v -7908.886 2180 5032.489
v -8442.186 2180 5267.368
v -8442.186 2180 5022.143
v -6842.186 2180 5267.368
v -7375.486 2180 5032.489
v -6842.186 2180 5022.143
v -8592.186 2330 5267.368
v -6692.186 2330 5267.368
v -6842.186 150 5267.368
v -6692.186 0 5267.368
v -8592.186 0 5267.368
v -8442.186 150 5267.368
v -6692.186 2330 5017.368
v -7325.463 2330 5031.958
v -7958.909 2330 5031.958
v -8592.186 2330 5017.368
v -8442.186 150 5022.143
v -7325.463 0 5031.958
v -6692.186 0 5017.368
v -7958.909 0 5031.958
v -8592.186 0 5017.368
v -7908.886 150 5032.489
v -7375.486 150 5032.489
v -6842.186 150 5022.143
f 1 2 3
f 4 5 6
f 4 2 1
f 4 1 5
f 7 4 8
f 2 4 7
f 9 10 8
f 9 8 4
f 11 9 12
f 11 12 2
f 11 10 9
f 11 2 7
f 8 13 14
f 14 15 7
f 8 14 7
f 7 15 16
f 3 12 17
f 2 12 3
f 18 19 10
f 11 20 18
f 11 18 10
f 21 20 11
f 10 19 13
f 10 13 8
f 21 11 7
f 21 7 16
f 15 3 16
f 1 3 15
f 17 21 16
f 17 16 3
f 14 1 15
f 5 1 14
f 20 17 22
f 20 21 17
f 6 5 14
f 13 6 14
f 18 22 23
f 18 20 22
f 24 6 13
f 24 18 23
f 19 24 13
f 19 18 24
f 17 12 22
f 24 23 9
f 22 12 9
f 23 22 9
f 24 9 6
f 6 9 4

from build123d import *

# Parameters (mm, degrees)
BOSS_EXTRUDE1_DEPTH = 2330
SKETCH3_W           = 1600
SKETCH3_H           = 2030
CUT_EXTRUDE1_DEPTH  = 3000


with BuildPart() as part:
    # Sketch2 → Boss-Extrude1 (new body)
    with BuildSketch(Plane(origin=(0, 0, 0), x_dir=(1, 0, 0), z_dir=(0, 1, 0))):
        with BuildLine():
            Line((-6692.186143144, -5017.367964626), (-6692.186143144, -5267.367964626))
            Line((-6692.186143144, -5267.367964626), (-8592.186143144, -5267.367964626))
            Line((-8592.186143144, -5267.367964626), (-8592.186143144, -5017.367964626))
            ThreePointArc((-8592.186143144, -5017.367964626), (-7642.186143144, -5033.781954063), (-6692.186143144, -5017.367964626))
        make_face()
    extrude(amount=BOSS_EXTRUDE1_DEPTH)

    # Sketch3 → Cut-Extrude1 (cut)
    with BuildSketch(Plane.XY.offset(5267.367964626)):
        with Locations((-7642.186143144, 1165)):
            Rectangle(SKETCH3_W, SKETCH3_H)
    extrude(amount=-CUT_EXTRUDE1_DEPTH, mode=Mode.SUBTRACT)


solid = part.part
